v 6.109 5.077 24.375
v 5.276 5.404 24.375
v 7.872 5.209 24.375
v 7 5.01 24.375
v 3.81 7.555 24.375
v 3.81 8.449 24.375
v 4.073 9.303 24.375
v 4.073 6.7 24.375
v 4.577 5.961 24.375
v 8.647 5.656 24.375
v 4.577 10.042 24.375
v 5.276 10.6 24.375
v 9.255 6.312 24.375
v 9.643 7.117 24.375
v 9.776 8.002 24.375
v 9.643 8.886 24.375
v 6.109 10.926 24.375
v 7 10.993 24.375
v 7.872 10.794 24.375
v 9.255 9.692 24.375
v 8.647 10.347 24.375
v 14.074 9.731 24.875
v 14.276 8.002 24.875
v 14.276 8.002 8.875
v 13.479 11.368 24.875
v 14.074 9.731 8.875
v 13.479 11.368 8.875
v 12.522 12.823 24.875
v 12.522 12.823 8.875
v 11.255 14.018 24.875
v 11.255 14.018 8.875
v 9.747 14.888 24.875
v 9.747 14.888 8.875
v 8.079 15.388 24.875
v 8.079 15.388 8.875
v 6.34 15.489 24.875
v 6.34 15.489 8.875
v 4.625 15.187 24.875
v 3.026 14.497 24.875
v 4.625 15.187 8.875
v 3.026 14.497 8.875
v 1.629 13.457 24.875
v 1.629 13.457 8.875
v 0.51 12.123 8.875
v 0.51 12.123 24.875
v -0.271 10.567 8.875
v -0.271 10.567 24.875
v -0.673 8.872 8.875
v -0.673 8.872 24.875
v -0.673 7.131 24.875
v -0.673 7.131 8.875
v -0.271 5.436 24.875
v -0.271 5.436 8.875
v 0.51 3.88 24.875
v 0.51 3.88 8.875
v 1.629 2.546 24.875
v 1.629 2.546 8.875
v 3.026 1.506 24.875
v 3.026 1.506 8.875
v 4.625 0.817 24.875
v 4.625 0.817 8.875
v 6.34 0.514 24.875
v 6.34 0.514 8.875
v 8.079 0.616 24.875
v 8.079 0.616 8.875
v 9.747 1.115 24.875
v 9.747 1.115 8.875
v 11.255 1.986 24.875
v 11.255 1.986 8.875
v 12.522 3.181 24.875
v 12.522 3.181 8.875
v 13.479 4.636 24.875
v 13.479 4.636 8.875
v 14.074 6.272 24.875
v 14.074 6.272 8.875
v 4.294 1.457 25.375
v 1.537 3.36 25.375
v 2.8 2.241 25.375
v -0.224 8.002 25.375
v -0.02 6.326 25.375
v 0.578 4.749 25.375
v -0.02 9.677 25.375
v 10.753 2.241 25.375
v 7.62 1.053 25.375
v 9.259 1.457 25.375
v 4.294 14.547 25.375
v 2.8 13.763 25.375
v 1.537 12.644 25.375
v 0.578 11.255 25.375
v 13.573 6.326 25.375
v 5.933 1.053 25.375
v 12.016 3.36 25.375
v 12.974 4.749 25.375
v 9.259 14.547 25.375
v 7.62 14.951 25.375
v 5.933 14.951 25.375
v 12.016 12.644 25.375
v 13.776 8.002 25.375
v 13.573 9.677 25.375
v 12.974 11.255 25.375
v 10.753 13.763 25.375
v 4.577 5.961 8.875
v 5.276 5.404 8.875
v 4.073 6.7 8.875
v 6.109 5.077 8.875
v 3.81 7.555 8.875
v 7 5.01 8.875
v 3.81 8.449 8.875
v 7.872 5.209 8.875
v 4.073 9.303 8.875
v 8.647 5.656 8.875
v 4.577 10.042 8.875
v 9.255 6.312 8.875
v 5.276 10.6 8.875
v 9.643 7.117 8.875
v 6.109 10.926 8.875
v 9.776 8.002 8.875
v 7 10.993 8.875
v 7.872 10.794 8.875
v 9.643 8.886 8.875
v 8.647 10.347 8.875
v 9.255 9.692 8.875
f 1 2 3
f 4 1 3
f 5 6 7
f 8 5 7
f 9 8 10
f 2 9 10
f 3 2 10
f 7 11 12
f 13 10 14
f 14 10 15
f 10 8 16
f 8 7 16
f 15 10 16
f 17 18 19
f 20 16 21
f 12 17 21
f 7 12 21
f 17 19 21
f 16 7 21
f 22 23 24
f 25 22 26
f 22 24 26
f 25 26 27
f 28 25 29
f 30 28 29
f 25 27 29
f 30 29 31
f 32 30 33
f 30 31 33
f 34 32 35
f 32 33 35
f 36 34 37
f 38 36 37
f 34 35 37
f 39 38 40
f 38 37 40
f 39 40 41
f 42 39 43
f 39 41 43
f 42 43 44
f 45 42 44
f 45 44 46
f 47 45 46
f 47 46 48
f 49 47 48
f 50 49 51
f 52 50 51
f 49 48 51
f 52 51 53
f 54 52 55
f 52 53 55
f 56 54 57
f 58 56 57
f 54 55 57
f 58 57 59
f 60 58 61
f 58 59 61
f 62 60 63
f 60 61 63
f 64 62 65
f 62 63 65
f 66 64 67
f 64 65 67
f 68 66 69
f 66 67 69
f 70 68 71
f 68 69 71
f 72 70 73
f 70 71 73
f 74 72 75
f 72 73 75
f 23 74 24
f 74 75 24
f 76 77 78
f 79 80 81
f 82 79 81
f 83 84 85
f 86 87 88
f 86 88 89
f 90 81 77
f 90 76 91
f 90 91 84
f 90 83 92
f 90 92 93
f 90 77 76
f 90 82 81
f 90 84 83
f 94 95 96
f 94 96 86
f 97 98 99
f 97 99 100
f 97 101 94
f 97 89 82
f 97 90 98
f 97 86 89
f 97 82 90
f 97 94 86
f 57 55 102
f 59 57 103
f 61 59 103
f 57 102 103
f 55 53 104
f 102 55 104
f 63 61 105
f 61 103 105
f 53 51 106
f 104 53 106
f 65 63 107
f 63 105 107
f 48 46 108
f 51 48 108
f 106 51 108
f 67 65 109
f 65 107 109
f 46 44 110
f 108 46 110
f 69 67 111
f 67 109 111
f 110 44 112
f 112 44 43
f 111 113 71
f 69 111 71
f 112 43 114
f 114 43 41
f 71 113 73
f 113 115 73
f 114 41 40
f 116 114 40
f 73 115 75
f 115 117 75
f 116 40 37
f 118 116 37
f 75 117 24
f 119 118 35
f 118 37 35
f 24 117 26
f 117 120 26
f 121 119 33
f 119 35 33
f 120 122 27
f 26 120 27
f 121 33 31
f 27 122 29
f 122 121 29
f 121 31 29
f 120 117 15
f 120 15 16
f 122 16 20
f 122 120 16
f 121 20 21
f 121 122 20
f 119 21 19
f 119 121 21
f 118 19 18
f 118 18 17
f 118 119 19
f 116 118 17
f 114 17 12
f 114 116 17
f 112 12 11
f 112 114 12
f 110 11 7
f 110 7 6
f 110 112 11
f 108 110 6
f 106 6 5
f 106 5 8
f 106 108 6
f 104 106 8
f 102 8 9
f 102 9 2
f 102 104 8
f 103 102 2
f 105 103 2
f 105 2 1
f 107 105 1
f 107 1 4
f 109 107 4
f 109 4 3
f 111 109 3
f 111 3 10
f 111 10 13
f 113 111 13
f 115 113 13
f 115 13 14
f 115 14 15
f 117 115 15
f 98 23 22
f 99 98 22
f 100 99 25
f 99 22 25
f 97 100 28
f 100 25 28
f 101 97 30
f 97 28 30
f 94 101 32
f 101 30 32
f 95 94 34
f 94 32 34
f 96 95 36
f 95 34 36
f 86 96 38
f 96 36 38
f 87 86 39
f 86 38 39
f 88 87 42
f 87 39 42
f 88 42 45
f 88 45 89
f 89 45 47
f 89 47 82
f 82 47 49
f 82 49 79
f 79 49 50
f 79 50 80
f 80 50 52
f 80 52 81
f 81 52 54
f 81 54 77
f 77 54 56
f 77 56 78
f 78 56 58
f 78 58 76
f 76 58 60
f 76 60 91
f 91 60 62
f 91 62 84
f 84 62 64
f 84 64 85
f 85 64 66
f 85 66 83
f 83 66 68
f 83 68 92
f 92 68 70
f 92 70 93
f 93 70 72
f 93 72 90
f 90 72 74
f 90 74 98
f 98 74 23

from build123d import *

# Parameters (mm, degrees)
EXTRUDE_START            = 8.875
SKETCH1_R                = 7.5
SKETCH1_R_2              = 3
EXTRUDE_KNOB_DEPTH       = 16.5
EXTRUDE_START_2          = 25.375
SKETCH1_3_R              = 3
EXTRUDE_KNOB_INNER_DEPTH = 1
CHAMFER_KNOB_SIZE        = 0.5


with BuildPart() as part:
    # Sketch1 → extrude knob (new body)
    with BuildSketch(Plane.XY.offset(EXTRUDE_START)):
        with Locations((6.776307172, 8.001648034)):
            Circle(SKETCH1_R)
        with Locations((6.776307172, 8.001648034)):
            Circle(SKETCH1_R_2, mode=Mode.SUBTRACT)
    extrude(amount=EXTRUDE_KNOB_DEPTH)

    # Sketch1<3> → extrude knob inner (add)
    with BuildSketch(Plane.XY.offset(EXTRUDE_START_2)):
        with Locations((6.776307172, 8.001648034)):
            Circle(SKETCH1_3_R)
    extrude(amount=-EXTRUDE_KNOB_INNER_DEPTH)

    # chamfer knob
    chamfer_knob_edges = [part.edges().sort_by_distance(p)[0] for p in [
        (-0.723692828, 8.001648034, 25.375),
    ]]
    chamfer(chamfer_knob_edges, length=CHAMFER_KNOB_SIZE)


solid = part.part
